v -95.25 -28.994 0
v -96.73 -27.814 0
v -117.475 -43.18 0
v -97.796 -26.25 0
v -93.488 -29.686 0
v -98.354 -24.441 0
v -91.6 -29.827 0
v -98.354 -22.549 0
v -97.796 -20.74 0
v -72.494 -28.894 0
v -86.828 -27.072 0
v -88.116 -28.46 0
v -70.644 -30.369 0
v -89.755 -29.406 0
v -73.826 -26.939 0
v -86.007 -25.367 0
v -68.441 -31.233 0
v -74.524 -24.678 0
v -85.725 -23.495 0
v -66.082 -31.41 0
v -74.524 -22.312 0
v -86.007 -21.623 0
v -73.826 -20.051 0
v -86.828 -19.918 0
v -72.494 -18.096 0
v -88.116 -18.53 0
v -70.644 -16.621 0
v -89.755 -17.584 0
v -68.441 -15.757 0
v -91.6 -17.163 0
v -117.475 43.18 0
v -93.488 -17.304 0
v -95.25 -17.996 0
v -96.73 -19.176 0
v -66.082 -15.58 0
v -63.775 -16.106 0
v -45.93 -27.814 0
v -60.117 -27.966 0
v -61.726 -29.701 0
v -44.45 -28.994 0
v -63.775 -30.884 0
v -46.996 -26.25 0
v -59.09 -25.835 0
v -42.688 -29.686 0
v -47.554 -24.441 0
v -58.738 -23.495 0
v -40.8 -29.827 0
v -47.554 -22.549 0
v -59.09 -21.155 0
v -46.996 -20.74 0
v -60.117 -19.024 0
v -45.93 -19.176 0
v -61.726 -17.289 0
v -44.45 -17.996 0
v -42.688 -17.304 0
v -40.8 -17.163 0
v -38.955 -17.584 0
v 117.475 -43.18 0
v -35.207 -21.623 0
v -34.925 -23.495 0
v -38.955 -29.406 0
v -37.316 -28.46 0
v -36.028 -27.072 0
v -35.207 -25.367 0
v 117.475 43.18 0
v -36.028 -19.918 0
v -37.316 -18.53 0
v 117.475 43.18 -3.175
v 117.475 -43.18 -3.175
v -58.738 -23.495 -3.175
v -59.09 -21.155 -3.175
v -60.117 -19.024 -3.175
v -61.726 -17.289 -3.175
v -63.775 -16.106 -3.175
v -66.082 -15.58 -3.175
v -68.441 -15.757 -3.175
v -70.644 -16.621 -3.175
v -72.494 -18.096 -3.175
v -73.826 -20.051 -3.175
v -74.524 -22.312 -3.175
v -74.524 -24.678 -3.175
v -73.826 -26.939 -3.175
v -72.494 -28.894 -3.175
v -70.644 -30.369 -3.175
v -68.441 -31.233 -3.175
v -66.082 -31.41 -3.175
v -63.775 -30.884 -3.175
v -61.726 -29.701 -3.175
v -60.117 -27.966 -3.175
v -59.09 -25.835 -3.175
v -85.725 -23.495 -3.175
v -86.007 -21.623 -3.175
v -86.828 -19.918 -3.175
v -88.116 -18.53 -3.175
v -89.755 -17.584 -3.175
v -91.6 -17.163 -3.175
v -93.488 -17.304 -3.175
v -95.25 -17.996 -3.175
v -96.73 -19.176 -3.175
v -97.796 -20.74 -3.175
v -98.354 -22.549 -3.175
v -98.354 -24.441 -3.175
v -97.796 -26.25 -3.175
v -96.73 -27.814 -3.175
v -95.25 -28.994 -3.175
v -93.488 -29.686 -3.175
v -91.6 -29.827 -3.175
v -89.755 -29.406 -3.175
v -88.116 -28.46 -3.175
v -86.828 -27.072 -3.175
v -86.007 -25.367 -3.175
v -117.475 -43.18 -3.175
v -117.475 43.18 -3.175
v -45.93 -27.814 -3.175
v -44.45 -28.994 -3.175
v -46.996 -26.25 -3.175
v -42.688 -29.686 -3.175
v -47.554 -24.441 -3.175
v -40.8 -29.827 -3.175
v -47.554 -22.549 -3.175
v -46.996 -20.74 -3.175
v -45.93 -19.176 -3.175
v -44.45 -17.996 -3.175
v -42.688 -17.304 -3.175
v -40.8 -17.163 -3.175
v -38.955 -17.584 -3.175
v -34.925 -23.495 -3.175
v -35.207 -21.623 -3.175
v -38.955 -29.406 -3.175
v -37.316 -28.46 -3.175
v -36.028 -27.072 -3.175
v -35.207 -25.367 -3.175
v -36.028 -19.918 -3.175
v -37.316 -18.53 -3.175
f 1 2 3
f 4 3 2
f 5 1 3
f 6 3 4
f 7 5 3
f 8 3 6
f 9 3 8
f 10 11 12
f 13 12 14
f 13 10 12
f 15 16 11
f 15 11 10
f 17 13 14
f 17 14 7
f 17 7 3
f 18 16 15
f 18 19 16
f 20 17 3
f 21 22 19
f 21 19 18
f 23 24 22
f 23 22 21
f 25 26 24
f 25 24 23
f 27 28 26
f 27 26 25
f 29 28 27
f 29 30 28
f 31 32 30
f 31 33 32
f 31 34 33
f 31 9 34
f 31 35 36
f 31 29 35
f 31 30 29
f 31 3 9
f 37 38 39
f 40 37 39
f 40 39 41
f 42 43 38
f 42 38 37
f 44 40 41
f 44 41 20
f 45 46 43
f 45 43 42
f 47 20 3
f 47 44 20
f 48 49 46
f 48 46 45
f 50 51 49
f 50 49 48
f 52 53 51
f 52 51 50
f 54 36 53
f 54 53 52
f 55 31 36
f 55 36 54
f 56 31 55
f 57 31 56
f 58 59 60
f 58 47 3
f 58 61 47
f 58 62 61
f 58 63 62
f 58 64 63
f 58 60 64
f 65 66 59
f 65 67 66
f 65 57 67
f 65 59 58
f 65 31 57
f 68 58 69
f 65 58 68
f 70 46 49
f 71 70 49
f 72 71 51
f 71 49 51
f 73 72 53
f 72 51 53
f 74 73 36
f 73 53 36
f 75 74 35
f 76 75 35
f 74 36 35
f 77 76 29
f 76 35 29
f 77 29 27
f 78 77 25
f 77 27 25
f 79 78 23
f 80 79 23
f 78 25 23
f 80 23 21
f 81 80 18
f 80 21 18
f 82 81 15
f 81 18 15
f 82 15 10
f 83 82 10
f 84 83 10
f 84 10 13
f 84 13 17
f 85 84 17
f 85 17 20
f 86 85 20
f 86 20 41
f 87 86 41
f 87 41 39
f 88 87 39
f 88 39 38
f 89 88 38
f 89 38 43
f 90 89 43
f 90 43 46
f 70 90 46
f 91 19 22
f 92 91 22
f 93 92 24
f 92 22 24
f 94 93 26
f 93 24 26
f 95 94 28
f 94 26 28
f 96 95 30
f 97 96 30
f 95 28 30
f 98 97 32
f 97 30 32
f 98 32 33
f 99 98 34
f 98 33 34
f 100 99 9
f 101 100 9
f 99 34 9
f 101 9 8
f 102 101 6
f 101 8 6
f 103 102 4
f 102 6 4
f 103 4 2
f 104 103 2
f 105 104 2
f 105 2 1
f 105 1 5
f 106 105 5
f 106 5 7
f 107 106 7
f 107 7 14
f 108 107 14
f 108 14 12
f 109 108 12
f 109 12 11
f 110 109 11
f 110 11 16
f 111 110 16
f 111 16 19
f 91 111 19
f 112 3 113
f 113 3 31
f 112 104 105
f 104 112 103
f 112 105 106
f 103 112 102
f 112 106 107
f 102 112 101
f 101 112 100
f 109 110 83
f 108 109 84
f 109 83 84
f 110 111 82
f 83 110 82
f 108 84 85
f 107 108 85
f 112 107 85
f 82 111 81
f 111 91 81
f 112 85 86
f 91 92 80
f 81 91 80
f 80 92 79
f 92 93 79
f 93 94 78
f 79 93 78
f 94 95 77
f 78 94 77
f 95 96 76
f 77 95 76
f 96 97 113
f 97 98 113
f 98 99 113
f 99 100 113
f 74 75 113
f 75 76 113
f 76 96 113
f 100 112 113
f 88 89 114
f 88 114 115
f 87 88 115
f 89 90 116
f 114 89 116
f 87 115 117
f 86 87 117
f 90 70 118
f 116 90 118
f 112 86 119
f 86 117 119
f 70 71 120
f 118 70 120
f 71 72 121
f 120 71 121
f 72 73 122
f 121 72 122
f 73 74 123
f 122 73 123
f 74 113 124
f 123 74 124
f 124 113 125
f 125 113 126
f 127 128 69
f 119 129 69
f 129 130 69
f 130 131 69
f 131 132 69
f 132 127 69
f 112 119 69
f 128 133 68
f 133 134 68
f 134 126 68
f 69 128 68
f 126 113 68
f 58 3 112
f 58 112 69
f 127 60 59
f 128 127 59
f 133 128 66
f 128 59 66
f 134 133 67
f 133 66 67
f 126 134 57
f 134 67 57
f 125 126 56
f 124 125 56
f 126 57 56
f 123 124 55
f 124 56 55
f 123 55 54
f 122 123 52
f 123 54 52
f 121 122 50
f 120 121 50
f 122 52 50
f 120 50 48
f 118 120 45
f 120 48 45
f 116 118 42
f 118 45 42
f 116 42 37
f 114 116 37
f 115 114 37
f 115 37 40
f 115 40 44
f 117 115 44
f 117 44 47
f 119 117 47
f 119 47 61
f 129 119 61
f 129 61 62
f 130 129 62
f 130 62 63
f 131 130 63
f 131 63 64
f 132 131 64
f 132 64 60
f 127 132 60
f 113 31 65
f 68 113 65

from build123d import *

# Parameters (mm, degrees)
SKETCH1_W          = 234.95
SKETCH1_H          = 86.36
BASE_FLANGE1_DEPTH = 3.175
SKETCH11_R         = 7.9375
CUT_EXTRUDE3_DEPTH = 126.199715056
SKETCH13_R         = 6.35
CUT_EXTRUDE5_DEPTH = 126.199715056
SKETCH14_R         = 6.35
CUT_EXTRUDE6_DEPTH = 126.199715056


# Sheet-metal steps are written as plain solids
with BuildPart() as part:
    # Sketch1 → Base-Flange1 (new body)
    with BuildSketch(Plane.XY):
        Rectangle(SKETCH1_W, SKETCH1_H)
    extrude(amount=-BASE_FLANGE1_DEPTH)

    # Sketch11 → Cut-Extrude3 (cut, through all)
    with BuildSketch(Plane.XY):
        with Locations((-66.675, -23.495)):
            Circle(SKETCH11_R)
    extrude(amount=-CUT_EXTRUDE3_DEPTH, mode=Mode.SUBTRACT)

    # Sketch13 → Cut-Extrude5 (cut, through all)
    with BuildSketch(Plane.XY):
        with Locations((-41.275, -23.495)):
            Circle(SKETCH13_R)
    extrude(amount=-CUT_EXTRUDE5_DEPTH, mode=Mode.SUBTRACT)

    # Sketch14 → Cut-Extrude6 (cut, through all)
    with BuildSketch(Plane.XY):
        with Locations((-92.075, -23.495)):
            Circle(SKETCH14_R)
    extrude(amount=-CUT_EXTRUDE6_DEPTH, mode=Mode.SUBTRACT)


solid = part.part
